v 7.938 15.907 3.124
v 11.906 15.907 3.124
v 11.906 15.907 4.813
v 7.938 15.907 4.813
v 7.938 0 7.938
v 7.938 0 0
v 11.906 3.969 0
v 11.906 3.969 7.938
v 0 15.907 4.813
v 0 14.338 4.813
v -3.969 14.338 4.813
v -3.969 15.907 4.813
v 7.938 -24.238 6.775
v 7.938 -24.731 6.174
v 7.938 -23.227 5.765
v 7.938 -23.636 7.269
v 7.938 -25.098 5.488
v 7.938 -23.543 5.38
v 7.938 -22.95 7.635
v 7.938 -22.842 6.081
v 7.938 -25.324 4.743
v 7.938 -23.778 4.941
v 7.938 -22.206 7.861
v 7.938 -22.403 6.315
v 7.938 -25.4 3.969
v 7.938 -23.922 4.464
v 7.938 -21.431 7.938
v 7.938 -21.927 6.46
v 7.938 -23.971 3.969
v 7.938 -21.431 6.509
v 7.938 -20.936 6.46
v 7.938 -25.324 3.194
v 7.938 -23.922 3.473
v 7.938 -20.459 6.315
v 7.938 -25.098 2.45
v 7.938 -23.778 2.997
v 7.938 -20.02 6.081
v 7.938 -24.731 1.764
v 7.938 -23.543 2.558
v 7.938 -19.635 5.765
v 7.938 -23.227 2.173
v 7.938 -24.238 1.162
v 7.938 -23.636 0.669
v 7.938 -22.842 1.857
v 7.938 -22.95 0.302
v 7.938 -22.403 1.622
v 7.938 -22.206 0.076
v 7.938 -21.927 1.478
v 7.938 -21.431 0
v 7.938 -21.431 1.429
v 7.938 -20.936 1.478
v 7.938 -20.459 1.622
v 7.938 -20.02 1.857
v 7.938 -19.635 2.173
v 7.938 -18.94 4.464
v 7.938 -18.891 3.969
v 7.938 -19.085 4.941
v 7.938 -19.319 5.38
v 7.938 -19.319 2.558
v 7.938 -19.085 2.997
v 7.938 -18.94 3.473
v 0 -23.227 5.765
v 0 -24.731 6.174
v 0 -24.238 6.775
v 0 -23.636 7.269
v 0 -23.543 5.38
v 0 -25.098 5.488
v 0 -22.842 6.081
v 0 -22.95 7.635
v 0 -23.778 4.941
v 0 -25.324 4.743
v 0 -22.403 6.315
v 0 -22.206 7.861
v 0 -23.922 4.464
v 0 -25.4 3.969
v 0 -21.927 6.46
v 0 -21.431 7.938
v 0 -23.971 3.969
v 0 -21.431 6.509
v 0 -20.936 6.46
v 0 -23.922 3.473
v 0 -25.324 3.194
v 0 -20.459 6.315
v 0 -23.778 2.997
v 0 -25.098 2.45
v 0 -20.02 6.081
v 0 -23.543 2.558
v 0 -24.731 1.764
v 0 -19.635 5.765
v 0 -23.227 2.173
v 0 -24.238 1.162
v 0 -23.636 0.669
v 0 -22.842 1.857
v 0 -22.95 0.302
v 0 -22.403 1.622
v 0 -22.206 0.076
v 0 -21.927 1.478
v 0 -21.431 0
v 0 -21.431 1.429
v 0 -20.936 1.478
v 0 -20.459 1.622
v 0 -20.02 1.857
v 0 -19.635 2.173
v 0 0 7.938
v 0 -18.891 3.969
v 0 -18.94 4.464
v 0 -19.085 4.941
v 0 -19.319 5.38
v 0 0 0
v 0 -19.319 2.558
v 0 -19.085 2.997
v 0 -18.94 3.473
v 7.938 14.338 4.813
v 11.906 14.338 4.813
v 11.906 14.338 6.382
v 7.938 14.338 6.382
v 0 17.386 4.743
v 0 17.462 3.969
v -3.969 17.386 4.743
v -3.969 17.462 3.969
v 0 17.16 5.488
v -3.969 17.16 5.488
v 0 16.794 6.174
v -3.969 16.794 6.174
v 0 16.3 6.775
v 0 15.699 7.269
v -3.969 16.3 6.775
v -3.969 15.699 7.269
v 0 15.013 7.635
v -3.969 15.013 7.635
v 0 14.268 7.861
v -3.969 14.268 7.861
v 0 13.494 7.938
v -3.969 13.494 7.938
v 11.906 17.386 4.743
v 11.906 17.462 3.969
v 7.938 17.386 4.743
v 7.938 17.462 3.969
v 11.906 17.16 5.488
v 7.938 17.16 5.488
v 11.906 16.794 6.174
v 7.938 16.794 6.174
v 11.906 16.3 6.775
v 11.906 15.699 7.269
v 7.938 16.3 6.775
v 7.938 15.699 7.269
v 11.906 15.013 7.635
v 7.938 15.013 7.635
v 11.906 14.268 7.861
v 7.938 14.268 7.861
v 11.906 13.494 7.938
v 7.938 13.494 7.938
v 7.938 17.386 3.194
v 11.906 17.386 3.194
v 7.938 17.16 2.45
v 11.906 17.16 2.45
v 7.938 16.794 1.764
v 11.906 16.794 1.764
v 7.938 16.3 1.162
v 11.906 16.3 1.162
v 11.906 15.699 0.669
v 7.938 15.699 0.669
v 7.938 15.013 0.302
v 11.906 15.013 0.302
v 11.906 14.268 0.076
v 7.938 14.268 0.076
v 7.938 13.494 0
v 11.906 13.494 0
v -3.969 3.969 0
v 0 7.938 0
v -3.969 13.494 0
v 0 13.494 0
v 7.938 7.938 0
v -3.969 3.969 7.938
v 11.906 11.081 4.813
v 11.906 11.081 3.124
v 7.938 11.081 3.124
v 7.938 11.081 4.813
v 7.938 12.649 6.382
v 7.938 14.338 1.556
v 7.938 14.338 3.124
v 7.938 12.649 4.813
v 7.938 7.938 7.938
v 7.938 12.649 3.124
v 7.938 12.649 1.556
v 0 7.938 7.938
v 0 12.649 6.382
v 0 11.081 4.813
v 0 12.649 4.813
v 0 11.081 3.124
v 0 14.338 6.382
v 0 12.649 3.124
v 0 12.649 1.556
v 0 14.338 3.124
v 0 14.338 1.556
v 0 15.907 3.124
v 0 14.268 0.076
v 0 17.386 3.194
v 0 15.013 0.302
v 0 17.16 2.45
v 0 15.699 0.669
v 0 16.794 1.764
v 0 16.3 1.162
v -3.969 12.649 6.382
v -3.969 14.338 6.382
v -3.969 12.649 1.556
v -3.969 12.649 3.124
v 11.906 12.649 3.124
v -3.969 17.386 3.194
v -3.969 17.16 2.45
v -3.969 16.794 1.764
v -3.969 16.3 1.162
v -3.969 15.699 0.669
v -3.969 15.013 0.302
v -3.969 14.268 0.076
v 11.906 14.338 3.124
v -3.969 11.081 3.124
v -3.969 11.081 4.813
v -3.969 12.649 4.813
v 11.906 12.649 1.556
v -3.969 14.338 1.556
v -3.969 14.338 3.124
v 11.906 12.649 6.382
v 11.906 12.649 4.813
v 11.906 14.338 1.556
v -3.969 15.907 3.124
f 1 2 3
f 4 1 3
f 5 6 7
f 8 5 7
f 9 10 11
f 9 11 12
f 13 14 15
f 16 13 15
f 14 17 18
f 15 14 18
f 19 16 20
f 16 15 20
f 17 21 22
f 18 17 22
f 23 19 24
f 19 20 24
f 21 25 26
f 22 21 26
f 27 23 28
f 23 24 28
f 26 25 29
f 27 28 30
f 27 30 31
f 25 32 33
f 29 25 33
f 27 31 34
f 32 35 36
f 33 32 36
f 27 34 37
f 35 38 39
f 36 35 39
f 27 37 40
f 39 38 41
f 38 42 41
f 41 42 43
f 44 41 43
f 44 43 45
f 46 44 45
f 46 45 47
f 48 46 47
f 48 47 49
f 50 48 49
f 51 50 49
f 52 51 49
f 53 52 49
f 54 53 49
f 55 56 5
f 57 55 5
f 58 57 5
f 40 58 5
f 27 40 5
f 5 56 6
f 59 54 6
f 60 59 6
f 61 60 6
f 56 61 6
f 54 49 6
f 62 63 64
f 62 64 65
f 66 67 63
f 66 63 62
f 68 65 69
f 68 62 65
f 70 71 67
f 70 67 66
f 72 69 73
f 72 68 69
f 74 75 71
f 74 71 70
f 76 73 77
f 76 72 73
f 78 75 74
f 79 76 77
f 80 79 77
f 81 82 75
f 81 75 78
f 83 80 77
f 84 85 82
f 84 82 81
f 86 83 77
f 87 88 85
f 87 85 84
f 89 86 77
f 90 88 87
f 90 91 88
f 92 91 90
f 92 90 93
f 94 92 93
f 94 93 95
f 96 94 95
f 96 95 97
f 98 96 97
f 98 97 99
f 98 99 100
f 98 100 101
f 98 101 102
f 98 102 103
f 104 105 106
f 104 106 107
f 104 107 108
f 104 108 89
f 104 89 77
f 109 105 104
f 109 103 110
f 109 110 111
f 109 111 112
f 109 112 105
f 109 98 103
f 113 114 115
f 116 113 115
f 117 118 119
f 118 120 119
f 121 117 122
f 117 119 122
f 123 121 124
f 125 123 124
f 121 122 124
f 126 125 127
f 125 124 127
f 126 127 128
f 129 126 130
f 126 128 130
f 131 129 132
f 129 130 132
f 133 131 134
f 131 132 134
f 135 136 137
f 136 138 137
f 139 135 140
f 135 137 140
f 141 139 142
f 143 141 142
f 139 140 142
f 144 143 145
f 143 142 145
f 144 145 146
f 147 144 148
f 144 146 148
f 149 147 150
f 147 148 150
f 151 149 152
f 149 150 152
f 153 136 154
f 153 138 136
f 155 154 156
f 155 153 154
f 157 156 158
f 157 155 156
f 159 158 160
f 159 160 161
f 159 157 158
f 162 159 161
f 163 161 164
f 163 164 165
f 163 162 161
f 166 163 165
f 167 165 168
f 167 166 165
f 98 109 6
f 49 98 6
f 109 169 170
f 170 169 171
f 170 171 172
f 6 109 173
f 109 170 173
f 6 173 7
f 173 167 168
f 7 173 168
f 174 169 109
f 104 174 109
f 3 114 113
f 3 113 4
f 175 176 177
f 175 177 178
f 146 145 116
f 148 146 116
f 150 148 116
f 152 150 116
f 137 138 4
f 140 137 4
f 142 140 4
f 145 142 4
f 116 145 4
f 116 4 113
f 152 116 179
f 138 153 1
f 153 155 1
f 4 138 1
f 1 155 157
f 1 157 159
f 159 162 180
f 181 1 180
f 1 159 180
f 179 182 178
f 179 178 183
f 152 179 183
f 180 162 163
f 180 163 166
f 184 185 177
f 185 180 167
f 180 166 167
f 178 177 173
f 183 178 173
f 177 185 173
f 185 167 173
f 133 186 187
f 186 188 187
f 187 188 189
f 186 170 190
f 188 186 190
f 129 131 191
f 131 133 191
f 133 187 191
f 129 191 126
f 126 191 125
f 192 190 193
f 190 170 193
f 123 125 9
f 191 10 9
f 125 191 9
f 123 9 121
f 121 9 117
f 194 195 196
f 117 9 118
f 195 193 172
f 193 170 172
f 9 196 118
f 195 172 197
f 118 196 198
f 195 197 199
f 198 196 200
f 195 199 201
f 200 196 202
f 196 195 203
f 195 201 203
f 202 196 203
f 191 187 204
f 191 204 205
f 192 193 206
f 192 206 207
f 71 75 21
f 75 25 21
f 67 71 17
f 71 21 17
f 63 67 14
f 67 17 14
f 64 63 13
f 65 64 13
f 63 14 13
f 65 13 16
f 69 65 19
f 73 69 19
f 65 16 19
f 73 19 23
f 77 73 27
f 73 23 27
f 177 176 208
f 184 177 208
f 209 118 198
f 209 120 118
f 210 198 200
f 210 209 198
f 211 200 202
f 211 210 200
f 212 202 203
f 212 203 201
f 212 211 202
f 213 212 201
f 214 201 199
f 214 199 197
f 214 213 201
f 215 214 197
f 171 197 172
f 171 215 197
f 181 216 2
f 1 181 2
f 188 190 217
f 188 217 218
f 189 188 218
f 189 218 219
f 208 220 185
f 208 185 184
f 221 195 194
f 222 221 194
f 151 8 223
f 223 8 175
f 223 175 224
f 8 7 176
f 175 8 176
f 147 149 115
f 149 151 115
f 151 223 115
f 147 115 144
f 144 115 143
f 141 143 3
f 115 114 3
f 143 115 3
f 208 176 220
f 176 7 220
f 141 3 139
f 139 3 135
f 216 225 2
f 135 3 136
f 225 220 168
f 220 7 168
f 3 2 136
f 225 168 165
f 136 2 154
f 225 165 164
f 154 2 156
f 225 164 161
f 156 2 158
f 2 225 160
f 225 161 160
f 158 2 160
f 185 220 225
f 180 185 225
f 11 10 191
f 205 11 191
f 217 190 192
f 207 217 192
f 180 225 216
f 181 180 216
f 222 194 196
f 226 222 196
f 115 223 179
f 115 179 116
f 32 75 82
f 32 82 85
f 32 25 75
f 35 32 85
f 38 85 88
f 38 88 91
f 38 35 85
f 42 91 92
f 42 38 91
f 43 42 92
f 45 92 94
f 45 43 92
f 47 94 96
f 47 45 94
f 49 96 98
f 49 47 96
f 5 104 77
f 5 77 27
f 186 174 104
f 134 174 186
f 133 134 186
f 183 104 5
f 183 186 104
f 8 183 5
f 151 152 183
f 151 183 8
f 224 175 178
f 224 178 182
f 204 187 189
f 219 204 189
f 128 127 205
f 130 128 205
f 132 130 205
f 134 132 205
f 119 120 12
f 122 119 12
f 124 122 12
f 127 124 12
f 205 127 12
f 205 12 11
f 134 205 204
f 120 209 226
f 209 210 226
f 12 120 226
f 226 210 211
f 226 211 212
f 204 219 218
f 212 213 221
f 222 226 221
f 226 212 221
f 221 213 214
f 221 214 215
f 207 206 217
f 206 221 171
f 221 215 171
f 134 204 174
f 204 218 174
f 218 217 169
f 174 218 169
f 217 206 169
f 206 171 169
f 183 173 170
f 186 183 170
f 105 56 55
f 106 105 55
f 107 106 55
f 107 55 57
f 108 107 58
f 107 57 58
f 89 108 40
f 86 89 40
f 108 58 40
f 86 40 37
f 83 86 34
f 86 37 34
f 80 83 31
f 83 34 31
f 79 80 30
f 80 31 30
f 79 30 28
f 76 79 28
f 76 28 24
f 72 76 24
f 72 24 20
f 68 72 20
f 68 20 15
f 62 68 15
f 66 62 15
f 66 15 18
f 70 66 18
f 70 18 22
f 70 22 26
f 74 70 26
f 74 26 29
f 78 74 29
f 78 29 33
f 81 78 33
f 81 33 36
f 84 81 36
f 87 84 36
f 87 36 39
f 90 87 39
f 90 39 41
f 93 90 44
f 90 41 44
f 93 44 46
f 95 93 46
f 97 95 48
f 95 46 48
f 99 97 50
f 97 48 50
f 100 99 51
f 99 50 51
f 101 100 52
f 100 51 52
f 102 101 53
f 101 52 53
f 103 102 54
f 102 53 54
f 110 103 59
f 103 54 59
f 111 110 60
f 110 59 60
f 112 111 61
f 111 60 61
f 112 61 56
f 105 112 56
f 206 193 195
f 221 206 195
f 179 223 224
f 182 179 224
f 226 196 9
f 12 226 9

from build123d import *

# Parameters (mm, degrees)
F0_W     = 7.9375
F0_H     = 25.4
F1_DEPTH = 7.9375
F2_R     = 3.96874
F3_W     = 1.6891
F3_H     = 1.56845
F3_W_2   = 1.56845
F3_H_2   = 1.6891
F3_R     = 2.54
F4_DEPTH = 15.875


# Not quite as in the source:
# - a fillet or chamfer is up to 0.001 mm smaller than in the source, because OpenCascade refuses the exact size


with BuildPart() as f1:
    # F0 (on Top) → F1 (new body)
    with BuildSketch(Plane.XY):
        Polygon((-3.96875, 3.96875), (0, 0), (7.9375, 0), (11.90625, 3.96875), (11.90625, 17.4625), (7.9375, 17.4625), (7.9375, 7.9375), (0, 7.9375), (0, 17.4625), (-3.96875, 17.4625), align=None)
        with Locations((3.96875, -12.7)):
            Rectangle(F0_W, F0_H)
    extrude(amount=F1_DEPTH)

    # F2 (radius 3.96875 in the source; OpenCascade refuses exactly that, so slightly less here)
    f2_edges = [f1.edges().sort_by_distance(p)[0] for p in [
        (3.96875, -25.4, 7.9375),
        (3.96875, -25.4, 0),
        (9.921875, 17.4625, 7.9375),
        (9.921875, 17.4625, 0),
        (-1.984375, 17.4625, 7.9375),
        (-1.984375, 17.4625, 0),
    ]]
    fillet(f2_edges, radius=F2_R)

    # F3 (on face) → F4 (cut, through all)
    with BuildSketch(Plane.YZ.offset(11.90625)):
        with Locations((13.49375, 5.597525)):
            Rectangle(F3_W, F3_H)
        with Locations((15.122525, 3.96875)):
            Rectangle(F3_W_2, F3_H_2)
        with Locations((13.49375, 3.96875)):
            Rectangle(F3_W, F3_H_2)
        with Locations((11.864975, 3.96875)):
            Rectangle(F3_W_2, F3_H_2)
        with Locations((13.49375, 2.339975)):
            Rectangle(F3_W, F3_H)
        with Locations((-21.43125, 3.96875)):
            Circle(F3_R)
    extrude(amount=-F4_DEPTH, mode=Mode.SUBTRACT)


solid = f1.part
